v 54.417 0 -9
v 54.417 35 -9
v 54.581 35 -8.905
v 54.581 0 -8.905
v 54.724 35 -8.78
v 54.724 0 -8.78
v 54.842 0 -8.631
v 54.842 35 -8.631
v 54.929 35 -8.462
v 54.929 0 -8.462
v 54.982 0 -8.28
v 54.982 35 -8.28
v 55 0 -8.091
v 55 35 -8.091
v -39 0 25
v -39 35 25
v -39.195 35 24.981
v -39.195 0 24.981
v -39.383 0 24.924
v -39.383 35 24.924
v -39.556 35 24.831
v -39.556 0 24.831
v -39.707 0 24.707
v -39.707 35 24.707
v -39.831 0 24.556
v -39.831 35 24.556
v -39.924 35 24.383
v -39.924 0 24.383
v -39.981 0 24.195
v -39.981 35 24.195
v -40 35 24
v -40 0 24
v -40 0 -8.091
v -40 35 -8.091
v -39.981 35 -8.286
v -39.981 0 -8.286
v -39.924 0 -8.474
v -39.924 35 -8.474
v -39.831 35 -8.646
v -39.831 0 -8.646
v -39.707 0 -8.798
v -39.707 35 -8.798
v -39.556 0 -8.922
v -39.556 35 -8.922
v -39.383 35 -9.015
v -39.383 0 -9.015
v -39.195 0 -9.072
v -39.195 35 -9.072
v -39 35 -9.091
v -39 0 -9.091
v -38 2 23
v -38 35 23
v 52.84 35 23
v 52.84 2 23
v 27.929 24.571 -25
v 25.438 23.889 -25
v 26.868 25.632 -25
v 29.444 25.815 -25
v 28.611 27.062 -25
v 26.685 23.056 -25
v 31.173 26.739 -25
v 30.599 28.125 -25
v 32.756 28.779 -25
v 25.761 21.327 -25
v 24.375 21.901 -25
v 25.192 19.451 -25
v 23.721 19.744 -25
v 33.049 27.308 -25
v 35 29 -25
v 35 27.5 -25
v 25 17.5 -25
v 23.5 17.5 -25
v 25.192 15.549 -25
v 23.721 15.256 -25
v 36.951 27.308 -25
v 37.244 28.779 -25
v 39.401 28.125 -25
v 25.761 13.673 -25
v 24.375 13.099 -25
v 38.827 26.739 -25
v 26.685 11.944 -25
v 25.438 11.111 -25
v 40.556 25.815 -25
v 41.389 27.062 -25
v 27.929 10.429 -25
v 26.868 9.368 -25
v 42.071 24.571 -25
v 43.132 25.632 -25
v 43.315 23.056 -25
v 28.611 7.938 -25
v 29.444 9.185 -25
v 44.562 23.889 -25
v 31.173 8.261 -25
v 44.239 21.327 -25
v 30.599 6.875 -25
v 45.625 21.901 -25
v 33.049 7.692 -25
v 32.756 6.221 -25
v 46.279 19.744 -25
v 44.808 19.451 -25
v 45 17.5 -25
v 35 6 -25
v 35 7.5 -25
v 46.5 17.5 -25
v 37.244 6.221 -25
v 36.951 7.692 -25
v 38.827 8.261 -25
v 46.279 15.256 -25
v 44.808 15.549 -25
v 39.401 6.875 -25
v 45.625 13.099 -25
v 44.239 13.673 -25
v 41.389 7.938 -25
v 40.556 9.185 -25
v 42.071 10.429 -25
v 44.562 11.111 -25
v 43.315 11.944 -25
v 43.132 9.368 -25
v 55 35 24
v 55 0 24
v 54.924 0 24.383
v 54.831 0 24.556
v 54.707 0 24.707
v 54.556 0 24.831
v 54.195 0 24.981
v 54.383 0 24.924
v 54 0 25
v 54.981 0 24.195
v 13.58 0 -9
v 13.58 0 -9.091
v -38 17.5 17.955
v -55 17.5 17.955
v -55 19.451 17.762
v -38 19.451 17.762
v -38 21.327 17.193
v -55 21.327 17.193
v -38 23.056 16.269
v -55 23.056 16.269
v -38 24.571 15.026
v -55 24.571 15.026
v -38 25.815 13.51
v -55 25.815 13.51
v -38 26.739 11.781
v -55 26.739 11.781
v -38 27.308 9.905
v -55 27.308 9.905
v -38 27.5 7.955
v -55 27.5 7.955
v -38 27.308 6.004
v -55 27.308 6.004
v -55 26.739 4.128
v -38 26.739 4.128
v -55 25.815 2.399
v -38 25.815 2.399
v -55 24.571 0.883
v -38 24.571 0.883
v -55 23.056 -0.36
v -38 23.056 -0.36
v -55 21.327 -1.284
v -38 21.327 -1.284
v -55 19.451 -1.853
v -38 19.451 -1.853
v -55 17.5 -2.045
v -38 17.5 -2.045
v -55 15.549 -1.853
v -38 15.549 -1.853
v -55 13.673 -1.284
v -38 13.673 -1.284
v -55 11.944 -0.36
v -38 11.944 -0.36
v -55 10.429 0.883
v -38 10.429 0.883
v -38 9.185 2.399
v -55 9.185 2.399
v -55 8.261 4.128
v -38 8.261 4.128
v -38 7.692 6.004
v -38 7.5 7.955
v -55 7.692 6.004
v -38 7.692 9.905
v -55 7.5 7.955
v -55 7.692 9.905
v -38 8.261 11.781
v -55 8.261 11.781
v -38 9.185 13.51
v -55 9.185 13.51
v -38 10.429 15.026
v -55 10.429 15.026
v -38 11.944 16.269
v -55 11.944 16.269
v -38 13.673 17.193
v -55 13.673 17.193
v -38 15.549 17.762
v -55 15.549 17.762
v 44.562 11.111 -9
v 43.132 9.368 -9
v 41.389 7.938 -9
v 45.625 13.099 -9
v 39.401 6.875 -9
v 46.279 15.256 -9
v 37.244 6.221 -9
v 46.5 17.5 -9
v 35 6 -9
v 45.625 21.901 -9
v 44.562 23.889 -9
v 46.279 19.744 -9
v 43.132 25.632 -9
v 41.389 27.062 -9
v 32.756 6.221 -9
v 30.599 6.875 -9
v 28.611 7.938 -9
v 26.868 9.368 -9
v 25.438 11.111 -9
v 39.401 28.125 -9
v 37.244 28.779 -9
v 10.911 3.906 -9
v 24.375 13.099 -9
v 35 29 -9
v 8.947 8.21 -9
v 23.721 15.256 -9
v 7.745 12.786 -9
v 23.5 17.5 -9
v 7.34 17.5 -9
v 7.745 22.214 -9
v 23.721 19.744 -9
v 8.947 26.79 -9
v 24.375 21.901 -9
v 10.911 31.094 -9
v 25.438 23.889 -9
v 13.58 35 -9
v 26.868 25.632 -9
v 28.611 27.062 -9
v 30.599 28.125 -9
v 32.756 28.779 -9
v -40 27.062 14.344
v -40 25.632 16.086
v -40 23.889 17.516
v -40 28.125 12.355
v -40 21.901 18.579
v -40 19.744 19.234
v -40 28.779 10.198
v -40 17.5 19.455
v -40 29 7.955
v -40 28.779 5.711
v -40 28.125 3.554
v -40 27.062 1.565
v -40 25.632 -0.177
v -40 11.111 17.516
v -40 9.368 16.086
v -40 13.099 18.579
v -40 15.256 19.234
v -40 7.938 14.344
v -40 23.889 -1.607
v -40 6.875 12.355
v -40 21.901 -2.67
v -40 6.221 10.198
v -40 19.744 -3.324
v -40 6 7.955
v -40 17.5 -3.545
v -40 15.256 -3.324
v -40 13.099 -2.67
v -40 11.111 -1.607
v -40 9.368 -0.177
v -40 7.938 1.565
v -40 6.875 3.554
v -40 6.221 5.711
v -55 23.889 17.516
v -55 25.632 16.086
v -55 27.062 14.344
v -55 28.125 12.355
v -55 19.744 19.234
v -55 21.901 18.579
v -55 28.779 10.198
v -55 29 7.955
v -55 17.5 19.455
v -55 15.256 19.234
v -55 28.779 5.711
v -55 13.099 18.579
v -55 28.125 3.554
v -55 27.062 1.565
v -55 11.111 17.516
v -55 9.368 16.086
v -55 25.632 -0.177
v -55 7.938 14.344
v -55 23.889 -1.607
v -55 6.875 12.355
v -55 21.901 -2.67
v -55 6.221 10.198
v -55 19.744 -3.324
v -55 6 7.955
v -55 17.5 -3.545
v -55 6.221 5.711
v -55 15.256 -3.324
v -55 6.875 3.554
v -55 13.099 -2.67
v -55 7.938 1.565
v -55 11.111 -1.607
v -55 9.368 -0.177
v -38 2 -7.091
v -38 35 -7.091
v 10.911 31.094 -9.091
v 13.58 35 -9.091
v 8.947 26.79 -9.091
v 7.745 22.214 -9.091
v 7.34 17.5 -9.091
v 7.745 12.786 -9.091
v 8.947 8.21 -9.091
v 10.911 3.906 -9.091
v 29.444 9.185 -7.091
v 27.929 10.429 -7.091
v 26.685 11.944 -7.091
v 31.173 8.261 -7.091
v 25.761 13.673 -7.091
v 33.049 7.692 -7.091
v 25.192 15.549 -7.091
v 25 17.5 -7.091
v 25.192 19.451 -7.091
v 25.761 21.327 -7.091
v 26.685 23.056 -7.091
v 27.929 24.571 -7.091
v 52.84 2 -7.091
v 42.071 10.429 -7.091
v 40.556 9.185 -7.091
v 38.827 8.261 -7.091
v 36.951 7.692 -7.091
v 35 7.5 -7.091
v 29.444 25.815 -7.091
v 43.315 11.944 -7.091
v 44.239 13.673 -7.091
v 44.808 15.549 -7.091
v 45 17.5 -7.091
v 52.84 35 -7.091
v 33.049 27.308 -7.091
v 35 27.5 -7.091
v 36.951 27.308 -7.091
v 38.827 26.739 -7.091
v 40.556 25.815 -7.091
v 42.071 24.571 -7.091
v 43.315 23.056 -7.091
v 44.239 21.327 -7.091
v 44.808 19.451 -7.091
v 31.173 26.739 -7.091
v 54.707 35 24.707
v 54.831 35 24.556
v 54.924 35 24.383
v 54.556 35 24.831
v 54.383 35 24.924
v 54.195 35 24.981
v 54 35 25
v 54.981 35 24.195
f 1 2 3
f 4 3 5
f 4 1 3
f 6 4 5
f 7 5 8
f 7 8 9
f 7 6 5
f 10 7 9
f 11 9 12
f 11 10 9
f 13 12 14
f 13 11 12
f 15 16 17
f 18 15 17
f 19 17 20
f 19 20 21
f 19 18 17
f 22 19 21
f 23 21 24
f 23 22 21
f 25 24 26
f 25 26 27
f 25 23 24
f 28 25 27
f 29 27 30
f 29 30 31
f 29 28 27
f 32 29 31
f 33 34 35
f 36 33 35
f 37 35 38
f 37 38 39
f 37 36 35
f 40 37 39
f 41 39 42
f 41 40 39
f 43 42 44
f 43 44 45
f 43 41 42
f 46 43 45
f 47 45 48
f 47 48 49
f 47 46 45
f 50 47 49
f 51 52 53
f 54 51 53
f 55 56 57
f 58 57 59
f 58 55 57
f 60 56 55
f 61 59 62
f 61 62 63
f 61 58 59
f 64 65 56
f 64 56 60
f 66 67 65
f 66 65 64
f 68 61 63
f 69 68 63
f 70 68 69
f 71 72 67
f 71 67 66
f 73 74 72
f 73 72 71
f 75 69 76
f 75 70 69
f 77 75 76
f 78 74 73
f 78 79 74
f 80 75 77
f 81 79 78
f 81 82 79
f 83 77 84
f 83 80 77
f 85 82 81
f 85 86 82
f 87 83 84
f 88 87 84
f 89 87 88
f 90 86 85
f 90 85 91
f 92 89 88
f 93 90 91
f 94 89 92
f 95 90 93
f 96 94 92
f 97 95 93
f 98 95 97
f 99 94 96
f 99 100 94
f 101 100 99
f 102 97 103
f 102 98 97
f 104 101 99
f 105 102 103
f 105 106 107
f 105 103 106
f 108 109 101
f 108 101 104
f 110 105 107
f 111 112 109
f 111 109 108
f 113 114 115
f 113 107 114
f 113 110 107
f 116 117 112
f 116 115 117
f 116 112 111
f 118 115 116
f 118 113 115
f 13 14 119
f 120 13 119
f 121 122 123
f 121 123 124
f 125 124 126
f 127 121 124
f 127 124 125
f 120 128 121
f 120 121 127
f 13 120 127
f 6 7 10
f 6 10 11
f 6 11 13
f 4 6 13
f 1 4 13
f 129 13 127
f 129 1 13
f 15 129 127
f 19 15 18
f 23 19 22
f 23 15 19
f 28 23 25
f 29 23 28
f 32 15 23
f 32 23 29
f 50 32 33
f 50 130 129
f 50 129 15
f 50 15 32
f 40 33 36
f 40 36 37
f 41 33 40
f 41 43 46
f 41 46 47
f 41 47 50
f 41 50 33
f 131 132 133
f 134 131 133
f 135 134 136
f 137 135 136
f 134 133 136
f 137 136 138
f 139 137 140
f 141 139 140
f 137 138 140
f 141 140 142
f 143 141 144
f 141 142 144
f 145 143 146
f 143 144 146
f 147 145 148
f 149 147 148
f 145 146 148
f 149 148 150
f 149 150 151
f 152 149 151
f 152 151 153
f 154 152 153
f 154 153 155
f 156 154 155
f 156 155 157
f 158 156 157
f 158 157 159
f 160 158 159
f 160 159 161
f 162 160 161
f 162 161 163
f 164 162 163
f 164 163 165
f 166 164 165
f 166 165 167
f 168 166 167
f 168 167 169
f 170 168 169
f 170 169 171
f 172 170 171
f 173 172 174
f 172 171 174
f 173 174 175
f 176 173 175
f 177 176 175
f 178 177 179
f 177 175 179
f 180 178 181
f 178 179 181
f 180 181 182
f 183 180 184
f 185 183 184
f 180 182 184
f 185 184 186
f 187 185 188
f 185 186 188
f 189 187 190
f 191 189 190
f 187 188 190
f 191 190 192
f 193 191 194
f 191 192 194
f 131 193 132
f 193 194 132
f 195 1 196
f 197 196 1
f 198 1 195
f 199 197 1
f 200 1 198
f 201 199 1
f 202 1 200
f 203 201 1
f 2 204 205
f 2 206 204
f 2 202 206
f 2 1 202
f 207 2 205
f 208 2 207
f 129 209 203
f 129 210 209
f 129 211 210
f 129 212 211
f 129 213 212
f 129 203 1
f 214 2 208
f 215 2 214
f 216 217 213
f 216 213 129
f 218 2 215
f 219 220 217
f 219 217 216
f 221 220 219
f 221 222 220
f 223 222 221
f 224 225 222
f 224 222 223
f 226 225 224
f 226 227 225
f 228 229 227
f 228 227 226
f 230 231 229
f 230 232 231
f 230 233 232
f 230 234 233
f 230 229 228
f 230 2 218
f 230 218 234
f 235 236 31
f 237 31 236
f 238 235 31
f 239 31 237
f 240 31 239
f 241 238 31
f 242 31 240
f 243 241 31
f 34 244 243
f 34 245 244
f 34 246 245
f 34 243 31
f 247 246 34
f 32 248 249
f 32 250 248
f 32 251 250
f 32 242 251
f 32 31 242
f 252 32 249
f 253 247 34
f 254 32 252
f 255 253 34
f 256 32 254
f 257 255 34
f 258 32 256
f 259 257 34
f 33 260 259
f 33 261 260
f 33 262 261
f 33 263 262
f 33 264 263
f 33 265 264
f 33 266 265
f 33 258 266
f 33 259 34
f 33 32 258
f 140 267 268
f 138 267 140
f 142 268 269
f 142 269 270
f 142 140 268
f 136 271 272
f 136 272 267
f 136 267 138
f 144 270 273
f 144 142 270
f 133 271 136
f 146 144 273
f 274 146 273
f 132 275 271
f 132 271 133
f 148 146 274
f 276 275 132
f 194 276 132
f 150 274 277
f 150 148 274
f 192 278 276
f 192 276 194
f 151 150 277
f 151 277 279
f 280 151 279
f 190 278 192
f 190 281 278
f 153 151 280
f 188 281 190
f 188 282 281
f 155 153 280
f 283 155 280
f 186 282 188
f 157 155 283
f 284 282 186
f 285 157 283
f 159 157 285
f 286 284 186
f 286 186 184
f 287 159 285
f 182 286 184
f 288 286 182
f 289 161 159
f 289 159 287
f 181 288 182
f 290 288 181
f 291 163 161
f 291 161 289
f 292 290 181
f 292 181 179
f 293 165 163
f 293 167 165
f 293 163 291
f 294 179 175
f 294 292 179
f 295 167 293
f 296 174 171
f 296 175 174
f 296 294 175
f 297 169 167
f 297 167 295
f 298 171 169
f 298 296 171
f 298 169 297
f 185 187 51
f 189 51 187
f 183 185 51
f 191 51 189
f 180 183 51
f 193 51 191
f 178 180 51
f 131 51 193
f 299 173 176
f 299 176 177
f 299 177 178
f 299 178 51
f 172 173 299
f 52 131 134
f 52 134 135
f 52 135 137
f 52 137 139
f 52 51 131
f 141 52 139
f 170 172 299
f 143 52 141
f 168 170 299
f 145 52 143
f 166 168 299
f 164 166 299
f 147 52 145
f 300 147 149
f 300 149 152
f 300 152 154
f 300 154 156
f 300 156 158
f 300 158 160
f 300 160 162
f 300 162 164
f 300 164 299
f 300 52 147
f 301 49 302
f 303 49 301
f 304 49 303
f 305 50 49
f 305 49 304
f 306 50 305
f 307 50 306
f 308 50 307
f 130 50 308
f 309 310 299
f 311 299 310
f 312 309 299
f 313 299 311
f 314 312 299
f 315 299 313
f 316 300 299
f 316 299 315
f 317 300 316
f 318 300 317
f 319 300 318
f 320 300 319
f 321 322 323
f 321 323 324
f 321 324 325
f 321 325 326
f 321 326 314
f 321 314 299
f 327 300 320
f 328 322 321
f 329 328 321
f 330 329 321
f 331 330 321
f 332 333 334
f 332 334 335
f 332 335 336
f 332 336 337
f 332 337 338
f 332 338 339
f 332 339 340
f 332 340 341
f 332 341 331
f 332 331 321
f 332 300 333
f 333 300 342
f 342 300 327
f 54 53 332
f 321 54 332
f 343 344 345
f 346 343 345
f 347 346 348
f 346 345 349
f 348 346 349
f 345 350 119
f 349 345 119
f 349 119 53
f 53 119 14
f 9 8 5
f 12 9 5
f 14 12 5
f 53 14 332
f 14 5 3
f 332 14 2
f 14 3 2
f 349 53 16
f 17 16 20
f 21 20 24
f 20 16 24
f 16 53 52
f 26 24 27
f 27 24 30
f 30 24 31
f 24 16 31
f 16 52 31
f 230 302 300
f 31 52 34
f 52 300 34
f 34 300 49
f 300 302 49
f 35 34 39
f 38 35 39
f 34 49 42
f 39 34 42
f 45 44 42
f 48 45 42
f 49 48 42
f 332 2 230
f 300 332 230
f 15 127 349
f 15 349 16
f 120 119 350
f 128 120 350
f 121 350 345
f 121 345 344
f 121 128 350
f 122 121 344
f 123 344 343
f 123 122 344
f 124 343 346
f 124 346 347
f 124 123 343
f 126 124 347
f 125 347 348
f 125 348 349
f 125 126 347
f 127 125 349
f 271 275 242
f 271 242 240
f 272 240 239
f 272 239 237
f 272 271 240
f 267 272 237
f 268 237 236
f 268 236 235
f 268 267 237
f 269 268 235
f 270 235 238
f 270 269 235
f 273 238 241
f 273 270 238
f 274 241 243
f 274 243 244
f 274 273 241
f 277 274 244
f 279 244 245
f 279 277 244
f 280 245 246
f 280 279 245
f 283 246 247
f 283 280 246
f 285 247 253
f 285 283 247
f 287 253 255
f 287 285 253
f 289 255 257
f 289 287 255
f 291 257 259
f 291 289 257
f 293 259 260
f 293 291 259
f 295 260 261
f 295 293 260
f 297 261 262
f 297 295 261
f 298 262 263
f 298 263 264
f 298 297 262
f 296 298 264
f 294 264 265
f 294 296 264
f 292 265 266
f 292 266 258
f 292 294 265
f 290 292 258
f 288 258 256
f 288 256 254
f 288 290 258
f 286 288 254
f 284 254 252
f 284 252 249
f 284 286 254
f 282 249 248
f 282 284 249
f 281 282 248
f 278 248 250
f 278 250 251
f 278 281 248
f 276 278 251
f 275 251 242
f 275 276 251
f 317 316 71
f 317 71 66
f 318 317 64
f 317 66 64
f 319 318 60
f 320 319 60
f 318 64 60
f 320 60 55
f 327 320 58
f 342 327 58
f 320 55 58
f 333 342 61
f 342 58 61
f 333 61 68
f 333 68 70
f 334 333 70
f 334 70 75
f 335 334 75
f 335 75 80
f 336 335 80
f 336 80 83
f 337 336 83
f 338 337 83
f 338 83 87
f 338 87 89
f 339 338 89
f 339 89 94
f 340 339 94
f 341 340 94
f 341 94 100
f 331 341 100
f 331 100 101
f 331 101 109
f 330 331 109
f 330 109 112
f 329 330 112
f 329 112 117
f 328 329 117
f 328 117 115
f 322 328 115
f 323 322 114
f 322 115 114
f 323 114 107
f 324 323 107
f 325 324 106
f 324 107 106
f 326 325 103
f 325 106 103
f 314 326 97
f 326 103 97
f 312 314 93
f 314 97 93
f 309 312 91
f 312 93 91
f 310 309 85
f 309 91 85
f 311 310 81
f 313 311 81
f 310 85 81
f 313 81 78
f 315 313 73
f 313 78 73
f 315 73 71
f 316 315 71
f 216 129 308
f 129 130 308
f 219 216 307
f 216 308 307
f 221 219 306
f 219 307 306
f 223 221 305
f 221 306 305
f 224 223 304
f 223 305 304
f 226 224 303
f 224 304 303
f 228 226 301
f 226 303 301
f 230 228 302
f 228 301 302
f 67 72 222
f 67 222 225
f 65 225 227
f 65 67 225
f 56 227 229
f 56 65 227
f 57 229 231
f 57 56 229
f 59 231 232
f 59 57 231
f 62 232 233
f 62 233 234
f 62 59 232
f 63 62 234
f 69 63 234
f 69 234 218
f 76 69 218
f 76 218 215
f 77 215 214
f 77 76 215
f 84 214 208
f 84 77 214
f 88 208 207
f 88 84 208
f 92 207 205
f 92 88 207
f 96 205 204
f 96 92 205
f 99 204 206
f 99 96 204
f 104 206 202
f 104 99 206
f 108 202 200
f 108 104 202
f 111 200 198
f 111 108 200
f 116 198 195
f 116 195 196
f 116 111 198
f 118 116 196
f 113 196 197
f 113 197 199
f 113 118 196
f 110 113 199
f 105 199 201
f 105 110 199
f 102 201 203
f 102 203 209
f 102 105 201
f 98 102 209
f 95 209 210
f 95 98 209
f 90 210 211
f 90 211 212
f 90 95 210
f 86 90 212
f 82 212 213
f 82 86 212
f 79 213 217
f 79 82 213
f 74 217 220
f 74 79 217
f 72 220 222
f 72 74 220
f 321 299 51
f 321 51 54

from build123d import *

# Parameters (mm, degrees)
SALIENTE_EXTRUIR1_DEPTH = 35
CROQUIS2_R              = 23.966278947
CROQUIS2_R_2            = 11.5
CORTAR_EXTRUIR1_DEPTH   = 15
CROQUIS3_R              = 27.659664681
CROQUIS3_R_2            = 11.5
CORTAR_EXTRUIR2_DEPTH   = 16
CROQUIS4_W              = 90.840335319
CROQUIS4_H              = 30.090909091
CORTAR_EXTRUIR3_DEPTH   = 33
CROQUIS5_R              = 10
CORTAR_EXTRUIR5_DEPTH   = 33
CROQUIS6_R              = 10
CORTAR_EXTRUIR6_DEPTH   = 33


with BuildPart() as part:
    # Croquis1 → Saliente-Extruir1 (new body)
    with BuildSketch(Plane(origin=(0, 0, 0), x_dir=(1, 0, 0), z_dir=(0, 1, 0))):
        with BuildLine():
            Line((54, -25), (-39, -25))
            ThreePointArc((-39, -25), (-39.707106781, -24.707106781), (-40, -24))
            Line((-40, -24), (-40, -23.954545455))
            ThreePointArc((-40, -23.954545455), (-40.292893219, -23.247438673), (-41, -22.954545455))
            Line((-41, -22.954545455), (-54, -22.954545455))
            ThreePointArc((-54, -22.954545455), (-54.707106781, -22.661652236), (-55, -21.954545455))
            Line((-55, -21.954545455), (-55, 6.045454545))
            ThreePointArc((-55, 6.045454545), (-54.707106781, 6.752561327), (-54, 7.045454545))
            Line((-54, 7.045454545), (-41, 7.045454545))
            ThreePointArc((-41, 7.045454545), (-40.292893219, 7.338347764), (-40, 8.045454545))
            Line((-40, 8.045454545), (-40, 8.090909091))
            ThreePointArc((-40, 8.090909091), (-39.707106781, 8.798015872), (-39, 9.090909091))
            Line((-39, 9.090909091), (19, 9.090909091))
            ThreePointArc((19, 9.090909091), (19.707106781, 9.38380231), (20, 10.090909091))
            Line((20, 10.090909091), (20, 24))
            ThreePointArc((20, 24), (20.292893219, 24.707106781), (21, 25))
            Line((21, 25), (49, 25))
            ThreePointArc((49, 25), (49.707106781, 24.707106781), (50, 24))
            Line((50, 24), (50, 10.090909091))
            ThreePointArc((50, 10.090909091), (50.292893219, 9.38380231), (51, 9.090909091))
            Line((51, 9.090909091), (54, 9.090909091))
            ThreePointArc((54, 9.090909091), (54.707106781, 8.798015872), (55, 8.090909091))
            Line((55, 8.090909091), (55, -24))
            ThreePointArc((55, -24), (54.707106781, -24.707106781), (54, -25))
        make_face()
    extrude(amount=SALIENTE_EXTRUIR1_DEPTH)

    # Croquis2 → Cortar-Extruir1 (cut)
    with BuildSketch(Plane.ZY.offset(55)):
        with Locations((7.954545455, 17.5)):
            Circle(CROQUIS2_R)
        with Locations((7.954545455, 17.5)):
            Circle(CROQUIS2_R_2, mode=Mode.SUBTRACT)
    extrude(amount=-CORTAR_EXTRUIR1_DEPTH, mode=Mode.SUBTRACT)

    # Croquis3 → Cortar-Extruir2 (cut)
    with BuildSketch(Plane(origin=(0, 0, -25), x_dir=(-1, 0, 0), z_dir=(0, 0, -1))):
        with Locations((-35, 17.5)):
            Circle(CROQUIS3_R)
        with Locations((-35, 17.5)):
            Circle(CROQUIS3_R_2, mode=Mode.SUBTRACT)
    extrude(amount=-CORTAR_EXTRUIR2_DEPTH, mode=Mode.SUBTRACT)

    # Croquis4 → Cortar-Extruir3 (cut)
    with BuildSketch(Plane(origin=(0, 35, 0), x_dir=(1, 0, 0), z_dir=(0, 1, 0))):
        with Locations((7.42016766, -7.954545454)):
            Rectangle(CROQUIS4_W, CROQUIS4_H)
    extrude(amount=-CORTAR_EXTRUIR3_DEPTH, mode=Mode.SUBTRACT)

    # Croquis5 → Cortar-Extruir5 (cut)
    with BuildSketch(Plane.ZY.offset(55)):
        with Locations((7.954545455, 17.5)):
            Circle(CROQUIS5_R)
    extrude(amount=-CORTAR_EXTRUIR5_DEPTH, mode=Mode.SUBTRACT)

    # Croquis6 → Cortar-Extruir6 (cut)
    with BuildSketch(Plane(origin=(0, 0, -25), x_dir=(-1, 0, 0), z_dir=(0, 0, -1))):
        with Locations((-35, 17.5)):
            Circle(CROQUIS6_R)
    extrude(amount=-CORTAR_EXTRUIR6_DEPTH, mode=Mode.SUBTRACT)


solid = part.part
